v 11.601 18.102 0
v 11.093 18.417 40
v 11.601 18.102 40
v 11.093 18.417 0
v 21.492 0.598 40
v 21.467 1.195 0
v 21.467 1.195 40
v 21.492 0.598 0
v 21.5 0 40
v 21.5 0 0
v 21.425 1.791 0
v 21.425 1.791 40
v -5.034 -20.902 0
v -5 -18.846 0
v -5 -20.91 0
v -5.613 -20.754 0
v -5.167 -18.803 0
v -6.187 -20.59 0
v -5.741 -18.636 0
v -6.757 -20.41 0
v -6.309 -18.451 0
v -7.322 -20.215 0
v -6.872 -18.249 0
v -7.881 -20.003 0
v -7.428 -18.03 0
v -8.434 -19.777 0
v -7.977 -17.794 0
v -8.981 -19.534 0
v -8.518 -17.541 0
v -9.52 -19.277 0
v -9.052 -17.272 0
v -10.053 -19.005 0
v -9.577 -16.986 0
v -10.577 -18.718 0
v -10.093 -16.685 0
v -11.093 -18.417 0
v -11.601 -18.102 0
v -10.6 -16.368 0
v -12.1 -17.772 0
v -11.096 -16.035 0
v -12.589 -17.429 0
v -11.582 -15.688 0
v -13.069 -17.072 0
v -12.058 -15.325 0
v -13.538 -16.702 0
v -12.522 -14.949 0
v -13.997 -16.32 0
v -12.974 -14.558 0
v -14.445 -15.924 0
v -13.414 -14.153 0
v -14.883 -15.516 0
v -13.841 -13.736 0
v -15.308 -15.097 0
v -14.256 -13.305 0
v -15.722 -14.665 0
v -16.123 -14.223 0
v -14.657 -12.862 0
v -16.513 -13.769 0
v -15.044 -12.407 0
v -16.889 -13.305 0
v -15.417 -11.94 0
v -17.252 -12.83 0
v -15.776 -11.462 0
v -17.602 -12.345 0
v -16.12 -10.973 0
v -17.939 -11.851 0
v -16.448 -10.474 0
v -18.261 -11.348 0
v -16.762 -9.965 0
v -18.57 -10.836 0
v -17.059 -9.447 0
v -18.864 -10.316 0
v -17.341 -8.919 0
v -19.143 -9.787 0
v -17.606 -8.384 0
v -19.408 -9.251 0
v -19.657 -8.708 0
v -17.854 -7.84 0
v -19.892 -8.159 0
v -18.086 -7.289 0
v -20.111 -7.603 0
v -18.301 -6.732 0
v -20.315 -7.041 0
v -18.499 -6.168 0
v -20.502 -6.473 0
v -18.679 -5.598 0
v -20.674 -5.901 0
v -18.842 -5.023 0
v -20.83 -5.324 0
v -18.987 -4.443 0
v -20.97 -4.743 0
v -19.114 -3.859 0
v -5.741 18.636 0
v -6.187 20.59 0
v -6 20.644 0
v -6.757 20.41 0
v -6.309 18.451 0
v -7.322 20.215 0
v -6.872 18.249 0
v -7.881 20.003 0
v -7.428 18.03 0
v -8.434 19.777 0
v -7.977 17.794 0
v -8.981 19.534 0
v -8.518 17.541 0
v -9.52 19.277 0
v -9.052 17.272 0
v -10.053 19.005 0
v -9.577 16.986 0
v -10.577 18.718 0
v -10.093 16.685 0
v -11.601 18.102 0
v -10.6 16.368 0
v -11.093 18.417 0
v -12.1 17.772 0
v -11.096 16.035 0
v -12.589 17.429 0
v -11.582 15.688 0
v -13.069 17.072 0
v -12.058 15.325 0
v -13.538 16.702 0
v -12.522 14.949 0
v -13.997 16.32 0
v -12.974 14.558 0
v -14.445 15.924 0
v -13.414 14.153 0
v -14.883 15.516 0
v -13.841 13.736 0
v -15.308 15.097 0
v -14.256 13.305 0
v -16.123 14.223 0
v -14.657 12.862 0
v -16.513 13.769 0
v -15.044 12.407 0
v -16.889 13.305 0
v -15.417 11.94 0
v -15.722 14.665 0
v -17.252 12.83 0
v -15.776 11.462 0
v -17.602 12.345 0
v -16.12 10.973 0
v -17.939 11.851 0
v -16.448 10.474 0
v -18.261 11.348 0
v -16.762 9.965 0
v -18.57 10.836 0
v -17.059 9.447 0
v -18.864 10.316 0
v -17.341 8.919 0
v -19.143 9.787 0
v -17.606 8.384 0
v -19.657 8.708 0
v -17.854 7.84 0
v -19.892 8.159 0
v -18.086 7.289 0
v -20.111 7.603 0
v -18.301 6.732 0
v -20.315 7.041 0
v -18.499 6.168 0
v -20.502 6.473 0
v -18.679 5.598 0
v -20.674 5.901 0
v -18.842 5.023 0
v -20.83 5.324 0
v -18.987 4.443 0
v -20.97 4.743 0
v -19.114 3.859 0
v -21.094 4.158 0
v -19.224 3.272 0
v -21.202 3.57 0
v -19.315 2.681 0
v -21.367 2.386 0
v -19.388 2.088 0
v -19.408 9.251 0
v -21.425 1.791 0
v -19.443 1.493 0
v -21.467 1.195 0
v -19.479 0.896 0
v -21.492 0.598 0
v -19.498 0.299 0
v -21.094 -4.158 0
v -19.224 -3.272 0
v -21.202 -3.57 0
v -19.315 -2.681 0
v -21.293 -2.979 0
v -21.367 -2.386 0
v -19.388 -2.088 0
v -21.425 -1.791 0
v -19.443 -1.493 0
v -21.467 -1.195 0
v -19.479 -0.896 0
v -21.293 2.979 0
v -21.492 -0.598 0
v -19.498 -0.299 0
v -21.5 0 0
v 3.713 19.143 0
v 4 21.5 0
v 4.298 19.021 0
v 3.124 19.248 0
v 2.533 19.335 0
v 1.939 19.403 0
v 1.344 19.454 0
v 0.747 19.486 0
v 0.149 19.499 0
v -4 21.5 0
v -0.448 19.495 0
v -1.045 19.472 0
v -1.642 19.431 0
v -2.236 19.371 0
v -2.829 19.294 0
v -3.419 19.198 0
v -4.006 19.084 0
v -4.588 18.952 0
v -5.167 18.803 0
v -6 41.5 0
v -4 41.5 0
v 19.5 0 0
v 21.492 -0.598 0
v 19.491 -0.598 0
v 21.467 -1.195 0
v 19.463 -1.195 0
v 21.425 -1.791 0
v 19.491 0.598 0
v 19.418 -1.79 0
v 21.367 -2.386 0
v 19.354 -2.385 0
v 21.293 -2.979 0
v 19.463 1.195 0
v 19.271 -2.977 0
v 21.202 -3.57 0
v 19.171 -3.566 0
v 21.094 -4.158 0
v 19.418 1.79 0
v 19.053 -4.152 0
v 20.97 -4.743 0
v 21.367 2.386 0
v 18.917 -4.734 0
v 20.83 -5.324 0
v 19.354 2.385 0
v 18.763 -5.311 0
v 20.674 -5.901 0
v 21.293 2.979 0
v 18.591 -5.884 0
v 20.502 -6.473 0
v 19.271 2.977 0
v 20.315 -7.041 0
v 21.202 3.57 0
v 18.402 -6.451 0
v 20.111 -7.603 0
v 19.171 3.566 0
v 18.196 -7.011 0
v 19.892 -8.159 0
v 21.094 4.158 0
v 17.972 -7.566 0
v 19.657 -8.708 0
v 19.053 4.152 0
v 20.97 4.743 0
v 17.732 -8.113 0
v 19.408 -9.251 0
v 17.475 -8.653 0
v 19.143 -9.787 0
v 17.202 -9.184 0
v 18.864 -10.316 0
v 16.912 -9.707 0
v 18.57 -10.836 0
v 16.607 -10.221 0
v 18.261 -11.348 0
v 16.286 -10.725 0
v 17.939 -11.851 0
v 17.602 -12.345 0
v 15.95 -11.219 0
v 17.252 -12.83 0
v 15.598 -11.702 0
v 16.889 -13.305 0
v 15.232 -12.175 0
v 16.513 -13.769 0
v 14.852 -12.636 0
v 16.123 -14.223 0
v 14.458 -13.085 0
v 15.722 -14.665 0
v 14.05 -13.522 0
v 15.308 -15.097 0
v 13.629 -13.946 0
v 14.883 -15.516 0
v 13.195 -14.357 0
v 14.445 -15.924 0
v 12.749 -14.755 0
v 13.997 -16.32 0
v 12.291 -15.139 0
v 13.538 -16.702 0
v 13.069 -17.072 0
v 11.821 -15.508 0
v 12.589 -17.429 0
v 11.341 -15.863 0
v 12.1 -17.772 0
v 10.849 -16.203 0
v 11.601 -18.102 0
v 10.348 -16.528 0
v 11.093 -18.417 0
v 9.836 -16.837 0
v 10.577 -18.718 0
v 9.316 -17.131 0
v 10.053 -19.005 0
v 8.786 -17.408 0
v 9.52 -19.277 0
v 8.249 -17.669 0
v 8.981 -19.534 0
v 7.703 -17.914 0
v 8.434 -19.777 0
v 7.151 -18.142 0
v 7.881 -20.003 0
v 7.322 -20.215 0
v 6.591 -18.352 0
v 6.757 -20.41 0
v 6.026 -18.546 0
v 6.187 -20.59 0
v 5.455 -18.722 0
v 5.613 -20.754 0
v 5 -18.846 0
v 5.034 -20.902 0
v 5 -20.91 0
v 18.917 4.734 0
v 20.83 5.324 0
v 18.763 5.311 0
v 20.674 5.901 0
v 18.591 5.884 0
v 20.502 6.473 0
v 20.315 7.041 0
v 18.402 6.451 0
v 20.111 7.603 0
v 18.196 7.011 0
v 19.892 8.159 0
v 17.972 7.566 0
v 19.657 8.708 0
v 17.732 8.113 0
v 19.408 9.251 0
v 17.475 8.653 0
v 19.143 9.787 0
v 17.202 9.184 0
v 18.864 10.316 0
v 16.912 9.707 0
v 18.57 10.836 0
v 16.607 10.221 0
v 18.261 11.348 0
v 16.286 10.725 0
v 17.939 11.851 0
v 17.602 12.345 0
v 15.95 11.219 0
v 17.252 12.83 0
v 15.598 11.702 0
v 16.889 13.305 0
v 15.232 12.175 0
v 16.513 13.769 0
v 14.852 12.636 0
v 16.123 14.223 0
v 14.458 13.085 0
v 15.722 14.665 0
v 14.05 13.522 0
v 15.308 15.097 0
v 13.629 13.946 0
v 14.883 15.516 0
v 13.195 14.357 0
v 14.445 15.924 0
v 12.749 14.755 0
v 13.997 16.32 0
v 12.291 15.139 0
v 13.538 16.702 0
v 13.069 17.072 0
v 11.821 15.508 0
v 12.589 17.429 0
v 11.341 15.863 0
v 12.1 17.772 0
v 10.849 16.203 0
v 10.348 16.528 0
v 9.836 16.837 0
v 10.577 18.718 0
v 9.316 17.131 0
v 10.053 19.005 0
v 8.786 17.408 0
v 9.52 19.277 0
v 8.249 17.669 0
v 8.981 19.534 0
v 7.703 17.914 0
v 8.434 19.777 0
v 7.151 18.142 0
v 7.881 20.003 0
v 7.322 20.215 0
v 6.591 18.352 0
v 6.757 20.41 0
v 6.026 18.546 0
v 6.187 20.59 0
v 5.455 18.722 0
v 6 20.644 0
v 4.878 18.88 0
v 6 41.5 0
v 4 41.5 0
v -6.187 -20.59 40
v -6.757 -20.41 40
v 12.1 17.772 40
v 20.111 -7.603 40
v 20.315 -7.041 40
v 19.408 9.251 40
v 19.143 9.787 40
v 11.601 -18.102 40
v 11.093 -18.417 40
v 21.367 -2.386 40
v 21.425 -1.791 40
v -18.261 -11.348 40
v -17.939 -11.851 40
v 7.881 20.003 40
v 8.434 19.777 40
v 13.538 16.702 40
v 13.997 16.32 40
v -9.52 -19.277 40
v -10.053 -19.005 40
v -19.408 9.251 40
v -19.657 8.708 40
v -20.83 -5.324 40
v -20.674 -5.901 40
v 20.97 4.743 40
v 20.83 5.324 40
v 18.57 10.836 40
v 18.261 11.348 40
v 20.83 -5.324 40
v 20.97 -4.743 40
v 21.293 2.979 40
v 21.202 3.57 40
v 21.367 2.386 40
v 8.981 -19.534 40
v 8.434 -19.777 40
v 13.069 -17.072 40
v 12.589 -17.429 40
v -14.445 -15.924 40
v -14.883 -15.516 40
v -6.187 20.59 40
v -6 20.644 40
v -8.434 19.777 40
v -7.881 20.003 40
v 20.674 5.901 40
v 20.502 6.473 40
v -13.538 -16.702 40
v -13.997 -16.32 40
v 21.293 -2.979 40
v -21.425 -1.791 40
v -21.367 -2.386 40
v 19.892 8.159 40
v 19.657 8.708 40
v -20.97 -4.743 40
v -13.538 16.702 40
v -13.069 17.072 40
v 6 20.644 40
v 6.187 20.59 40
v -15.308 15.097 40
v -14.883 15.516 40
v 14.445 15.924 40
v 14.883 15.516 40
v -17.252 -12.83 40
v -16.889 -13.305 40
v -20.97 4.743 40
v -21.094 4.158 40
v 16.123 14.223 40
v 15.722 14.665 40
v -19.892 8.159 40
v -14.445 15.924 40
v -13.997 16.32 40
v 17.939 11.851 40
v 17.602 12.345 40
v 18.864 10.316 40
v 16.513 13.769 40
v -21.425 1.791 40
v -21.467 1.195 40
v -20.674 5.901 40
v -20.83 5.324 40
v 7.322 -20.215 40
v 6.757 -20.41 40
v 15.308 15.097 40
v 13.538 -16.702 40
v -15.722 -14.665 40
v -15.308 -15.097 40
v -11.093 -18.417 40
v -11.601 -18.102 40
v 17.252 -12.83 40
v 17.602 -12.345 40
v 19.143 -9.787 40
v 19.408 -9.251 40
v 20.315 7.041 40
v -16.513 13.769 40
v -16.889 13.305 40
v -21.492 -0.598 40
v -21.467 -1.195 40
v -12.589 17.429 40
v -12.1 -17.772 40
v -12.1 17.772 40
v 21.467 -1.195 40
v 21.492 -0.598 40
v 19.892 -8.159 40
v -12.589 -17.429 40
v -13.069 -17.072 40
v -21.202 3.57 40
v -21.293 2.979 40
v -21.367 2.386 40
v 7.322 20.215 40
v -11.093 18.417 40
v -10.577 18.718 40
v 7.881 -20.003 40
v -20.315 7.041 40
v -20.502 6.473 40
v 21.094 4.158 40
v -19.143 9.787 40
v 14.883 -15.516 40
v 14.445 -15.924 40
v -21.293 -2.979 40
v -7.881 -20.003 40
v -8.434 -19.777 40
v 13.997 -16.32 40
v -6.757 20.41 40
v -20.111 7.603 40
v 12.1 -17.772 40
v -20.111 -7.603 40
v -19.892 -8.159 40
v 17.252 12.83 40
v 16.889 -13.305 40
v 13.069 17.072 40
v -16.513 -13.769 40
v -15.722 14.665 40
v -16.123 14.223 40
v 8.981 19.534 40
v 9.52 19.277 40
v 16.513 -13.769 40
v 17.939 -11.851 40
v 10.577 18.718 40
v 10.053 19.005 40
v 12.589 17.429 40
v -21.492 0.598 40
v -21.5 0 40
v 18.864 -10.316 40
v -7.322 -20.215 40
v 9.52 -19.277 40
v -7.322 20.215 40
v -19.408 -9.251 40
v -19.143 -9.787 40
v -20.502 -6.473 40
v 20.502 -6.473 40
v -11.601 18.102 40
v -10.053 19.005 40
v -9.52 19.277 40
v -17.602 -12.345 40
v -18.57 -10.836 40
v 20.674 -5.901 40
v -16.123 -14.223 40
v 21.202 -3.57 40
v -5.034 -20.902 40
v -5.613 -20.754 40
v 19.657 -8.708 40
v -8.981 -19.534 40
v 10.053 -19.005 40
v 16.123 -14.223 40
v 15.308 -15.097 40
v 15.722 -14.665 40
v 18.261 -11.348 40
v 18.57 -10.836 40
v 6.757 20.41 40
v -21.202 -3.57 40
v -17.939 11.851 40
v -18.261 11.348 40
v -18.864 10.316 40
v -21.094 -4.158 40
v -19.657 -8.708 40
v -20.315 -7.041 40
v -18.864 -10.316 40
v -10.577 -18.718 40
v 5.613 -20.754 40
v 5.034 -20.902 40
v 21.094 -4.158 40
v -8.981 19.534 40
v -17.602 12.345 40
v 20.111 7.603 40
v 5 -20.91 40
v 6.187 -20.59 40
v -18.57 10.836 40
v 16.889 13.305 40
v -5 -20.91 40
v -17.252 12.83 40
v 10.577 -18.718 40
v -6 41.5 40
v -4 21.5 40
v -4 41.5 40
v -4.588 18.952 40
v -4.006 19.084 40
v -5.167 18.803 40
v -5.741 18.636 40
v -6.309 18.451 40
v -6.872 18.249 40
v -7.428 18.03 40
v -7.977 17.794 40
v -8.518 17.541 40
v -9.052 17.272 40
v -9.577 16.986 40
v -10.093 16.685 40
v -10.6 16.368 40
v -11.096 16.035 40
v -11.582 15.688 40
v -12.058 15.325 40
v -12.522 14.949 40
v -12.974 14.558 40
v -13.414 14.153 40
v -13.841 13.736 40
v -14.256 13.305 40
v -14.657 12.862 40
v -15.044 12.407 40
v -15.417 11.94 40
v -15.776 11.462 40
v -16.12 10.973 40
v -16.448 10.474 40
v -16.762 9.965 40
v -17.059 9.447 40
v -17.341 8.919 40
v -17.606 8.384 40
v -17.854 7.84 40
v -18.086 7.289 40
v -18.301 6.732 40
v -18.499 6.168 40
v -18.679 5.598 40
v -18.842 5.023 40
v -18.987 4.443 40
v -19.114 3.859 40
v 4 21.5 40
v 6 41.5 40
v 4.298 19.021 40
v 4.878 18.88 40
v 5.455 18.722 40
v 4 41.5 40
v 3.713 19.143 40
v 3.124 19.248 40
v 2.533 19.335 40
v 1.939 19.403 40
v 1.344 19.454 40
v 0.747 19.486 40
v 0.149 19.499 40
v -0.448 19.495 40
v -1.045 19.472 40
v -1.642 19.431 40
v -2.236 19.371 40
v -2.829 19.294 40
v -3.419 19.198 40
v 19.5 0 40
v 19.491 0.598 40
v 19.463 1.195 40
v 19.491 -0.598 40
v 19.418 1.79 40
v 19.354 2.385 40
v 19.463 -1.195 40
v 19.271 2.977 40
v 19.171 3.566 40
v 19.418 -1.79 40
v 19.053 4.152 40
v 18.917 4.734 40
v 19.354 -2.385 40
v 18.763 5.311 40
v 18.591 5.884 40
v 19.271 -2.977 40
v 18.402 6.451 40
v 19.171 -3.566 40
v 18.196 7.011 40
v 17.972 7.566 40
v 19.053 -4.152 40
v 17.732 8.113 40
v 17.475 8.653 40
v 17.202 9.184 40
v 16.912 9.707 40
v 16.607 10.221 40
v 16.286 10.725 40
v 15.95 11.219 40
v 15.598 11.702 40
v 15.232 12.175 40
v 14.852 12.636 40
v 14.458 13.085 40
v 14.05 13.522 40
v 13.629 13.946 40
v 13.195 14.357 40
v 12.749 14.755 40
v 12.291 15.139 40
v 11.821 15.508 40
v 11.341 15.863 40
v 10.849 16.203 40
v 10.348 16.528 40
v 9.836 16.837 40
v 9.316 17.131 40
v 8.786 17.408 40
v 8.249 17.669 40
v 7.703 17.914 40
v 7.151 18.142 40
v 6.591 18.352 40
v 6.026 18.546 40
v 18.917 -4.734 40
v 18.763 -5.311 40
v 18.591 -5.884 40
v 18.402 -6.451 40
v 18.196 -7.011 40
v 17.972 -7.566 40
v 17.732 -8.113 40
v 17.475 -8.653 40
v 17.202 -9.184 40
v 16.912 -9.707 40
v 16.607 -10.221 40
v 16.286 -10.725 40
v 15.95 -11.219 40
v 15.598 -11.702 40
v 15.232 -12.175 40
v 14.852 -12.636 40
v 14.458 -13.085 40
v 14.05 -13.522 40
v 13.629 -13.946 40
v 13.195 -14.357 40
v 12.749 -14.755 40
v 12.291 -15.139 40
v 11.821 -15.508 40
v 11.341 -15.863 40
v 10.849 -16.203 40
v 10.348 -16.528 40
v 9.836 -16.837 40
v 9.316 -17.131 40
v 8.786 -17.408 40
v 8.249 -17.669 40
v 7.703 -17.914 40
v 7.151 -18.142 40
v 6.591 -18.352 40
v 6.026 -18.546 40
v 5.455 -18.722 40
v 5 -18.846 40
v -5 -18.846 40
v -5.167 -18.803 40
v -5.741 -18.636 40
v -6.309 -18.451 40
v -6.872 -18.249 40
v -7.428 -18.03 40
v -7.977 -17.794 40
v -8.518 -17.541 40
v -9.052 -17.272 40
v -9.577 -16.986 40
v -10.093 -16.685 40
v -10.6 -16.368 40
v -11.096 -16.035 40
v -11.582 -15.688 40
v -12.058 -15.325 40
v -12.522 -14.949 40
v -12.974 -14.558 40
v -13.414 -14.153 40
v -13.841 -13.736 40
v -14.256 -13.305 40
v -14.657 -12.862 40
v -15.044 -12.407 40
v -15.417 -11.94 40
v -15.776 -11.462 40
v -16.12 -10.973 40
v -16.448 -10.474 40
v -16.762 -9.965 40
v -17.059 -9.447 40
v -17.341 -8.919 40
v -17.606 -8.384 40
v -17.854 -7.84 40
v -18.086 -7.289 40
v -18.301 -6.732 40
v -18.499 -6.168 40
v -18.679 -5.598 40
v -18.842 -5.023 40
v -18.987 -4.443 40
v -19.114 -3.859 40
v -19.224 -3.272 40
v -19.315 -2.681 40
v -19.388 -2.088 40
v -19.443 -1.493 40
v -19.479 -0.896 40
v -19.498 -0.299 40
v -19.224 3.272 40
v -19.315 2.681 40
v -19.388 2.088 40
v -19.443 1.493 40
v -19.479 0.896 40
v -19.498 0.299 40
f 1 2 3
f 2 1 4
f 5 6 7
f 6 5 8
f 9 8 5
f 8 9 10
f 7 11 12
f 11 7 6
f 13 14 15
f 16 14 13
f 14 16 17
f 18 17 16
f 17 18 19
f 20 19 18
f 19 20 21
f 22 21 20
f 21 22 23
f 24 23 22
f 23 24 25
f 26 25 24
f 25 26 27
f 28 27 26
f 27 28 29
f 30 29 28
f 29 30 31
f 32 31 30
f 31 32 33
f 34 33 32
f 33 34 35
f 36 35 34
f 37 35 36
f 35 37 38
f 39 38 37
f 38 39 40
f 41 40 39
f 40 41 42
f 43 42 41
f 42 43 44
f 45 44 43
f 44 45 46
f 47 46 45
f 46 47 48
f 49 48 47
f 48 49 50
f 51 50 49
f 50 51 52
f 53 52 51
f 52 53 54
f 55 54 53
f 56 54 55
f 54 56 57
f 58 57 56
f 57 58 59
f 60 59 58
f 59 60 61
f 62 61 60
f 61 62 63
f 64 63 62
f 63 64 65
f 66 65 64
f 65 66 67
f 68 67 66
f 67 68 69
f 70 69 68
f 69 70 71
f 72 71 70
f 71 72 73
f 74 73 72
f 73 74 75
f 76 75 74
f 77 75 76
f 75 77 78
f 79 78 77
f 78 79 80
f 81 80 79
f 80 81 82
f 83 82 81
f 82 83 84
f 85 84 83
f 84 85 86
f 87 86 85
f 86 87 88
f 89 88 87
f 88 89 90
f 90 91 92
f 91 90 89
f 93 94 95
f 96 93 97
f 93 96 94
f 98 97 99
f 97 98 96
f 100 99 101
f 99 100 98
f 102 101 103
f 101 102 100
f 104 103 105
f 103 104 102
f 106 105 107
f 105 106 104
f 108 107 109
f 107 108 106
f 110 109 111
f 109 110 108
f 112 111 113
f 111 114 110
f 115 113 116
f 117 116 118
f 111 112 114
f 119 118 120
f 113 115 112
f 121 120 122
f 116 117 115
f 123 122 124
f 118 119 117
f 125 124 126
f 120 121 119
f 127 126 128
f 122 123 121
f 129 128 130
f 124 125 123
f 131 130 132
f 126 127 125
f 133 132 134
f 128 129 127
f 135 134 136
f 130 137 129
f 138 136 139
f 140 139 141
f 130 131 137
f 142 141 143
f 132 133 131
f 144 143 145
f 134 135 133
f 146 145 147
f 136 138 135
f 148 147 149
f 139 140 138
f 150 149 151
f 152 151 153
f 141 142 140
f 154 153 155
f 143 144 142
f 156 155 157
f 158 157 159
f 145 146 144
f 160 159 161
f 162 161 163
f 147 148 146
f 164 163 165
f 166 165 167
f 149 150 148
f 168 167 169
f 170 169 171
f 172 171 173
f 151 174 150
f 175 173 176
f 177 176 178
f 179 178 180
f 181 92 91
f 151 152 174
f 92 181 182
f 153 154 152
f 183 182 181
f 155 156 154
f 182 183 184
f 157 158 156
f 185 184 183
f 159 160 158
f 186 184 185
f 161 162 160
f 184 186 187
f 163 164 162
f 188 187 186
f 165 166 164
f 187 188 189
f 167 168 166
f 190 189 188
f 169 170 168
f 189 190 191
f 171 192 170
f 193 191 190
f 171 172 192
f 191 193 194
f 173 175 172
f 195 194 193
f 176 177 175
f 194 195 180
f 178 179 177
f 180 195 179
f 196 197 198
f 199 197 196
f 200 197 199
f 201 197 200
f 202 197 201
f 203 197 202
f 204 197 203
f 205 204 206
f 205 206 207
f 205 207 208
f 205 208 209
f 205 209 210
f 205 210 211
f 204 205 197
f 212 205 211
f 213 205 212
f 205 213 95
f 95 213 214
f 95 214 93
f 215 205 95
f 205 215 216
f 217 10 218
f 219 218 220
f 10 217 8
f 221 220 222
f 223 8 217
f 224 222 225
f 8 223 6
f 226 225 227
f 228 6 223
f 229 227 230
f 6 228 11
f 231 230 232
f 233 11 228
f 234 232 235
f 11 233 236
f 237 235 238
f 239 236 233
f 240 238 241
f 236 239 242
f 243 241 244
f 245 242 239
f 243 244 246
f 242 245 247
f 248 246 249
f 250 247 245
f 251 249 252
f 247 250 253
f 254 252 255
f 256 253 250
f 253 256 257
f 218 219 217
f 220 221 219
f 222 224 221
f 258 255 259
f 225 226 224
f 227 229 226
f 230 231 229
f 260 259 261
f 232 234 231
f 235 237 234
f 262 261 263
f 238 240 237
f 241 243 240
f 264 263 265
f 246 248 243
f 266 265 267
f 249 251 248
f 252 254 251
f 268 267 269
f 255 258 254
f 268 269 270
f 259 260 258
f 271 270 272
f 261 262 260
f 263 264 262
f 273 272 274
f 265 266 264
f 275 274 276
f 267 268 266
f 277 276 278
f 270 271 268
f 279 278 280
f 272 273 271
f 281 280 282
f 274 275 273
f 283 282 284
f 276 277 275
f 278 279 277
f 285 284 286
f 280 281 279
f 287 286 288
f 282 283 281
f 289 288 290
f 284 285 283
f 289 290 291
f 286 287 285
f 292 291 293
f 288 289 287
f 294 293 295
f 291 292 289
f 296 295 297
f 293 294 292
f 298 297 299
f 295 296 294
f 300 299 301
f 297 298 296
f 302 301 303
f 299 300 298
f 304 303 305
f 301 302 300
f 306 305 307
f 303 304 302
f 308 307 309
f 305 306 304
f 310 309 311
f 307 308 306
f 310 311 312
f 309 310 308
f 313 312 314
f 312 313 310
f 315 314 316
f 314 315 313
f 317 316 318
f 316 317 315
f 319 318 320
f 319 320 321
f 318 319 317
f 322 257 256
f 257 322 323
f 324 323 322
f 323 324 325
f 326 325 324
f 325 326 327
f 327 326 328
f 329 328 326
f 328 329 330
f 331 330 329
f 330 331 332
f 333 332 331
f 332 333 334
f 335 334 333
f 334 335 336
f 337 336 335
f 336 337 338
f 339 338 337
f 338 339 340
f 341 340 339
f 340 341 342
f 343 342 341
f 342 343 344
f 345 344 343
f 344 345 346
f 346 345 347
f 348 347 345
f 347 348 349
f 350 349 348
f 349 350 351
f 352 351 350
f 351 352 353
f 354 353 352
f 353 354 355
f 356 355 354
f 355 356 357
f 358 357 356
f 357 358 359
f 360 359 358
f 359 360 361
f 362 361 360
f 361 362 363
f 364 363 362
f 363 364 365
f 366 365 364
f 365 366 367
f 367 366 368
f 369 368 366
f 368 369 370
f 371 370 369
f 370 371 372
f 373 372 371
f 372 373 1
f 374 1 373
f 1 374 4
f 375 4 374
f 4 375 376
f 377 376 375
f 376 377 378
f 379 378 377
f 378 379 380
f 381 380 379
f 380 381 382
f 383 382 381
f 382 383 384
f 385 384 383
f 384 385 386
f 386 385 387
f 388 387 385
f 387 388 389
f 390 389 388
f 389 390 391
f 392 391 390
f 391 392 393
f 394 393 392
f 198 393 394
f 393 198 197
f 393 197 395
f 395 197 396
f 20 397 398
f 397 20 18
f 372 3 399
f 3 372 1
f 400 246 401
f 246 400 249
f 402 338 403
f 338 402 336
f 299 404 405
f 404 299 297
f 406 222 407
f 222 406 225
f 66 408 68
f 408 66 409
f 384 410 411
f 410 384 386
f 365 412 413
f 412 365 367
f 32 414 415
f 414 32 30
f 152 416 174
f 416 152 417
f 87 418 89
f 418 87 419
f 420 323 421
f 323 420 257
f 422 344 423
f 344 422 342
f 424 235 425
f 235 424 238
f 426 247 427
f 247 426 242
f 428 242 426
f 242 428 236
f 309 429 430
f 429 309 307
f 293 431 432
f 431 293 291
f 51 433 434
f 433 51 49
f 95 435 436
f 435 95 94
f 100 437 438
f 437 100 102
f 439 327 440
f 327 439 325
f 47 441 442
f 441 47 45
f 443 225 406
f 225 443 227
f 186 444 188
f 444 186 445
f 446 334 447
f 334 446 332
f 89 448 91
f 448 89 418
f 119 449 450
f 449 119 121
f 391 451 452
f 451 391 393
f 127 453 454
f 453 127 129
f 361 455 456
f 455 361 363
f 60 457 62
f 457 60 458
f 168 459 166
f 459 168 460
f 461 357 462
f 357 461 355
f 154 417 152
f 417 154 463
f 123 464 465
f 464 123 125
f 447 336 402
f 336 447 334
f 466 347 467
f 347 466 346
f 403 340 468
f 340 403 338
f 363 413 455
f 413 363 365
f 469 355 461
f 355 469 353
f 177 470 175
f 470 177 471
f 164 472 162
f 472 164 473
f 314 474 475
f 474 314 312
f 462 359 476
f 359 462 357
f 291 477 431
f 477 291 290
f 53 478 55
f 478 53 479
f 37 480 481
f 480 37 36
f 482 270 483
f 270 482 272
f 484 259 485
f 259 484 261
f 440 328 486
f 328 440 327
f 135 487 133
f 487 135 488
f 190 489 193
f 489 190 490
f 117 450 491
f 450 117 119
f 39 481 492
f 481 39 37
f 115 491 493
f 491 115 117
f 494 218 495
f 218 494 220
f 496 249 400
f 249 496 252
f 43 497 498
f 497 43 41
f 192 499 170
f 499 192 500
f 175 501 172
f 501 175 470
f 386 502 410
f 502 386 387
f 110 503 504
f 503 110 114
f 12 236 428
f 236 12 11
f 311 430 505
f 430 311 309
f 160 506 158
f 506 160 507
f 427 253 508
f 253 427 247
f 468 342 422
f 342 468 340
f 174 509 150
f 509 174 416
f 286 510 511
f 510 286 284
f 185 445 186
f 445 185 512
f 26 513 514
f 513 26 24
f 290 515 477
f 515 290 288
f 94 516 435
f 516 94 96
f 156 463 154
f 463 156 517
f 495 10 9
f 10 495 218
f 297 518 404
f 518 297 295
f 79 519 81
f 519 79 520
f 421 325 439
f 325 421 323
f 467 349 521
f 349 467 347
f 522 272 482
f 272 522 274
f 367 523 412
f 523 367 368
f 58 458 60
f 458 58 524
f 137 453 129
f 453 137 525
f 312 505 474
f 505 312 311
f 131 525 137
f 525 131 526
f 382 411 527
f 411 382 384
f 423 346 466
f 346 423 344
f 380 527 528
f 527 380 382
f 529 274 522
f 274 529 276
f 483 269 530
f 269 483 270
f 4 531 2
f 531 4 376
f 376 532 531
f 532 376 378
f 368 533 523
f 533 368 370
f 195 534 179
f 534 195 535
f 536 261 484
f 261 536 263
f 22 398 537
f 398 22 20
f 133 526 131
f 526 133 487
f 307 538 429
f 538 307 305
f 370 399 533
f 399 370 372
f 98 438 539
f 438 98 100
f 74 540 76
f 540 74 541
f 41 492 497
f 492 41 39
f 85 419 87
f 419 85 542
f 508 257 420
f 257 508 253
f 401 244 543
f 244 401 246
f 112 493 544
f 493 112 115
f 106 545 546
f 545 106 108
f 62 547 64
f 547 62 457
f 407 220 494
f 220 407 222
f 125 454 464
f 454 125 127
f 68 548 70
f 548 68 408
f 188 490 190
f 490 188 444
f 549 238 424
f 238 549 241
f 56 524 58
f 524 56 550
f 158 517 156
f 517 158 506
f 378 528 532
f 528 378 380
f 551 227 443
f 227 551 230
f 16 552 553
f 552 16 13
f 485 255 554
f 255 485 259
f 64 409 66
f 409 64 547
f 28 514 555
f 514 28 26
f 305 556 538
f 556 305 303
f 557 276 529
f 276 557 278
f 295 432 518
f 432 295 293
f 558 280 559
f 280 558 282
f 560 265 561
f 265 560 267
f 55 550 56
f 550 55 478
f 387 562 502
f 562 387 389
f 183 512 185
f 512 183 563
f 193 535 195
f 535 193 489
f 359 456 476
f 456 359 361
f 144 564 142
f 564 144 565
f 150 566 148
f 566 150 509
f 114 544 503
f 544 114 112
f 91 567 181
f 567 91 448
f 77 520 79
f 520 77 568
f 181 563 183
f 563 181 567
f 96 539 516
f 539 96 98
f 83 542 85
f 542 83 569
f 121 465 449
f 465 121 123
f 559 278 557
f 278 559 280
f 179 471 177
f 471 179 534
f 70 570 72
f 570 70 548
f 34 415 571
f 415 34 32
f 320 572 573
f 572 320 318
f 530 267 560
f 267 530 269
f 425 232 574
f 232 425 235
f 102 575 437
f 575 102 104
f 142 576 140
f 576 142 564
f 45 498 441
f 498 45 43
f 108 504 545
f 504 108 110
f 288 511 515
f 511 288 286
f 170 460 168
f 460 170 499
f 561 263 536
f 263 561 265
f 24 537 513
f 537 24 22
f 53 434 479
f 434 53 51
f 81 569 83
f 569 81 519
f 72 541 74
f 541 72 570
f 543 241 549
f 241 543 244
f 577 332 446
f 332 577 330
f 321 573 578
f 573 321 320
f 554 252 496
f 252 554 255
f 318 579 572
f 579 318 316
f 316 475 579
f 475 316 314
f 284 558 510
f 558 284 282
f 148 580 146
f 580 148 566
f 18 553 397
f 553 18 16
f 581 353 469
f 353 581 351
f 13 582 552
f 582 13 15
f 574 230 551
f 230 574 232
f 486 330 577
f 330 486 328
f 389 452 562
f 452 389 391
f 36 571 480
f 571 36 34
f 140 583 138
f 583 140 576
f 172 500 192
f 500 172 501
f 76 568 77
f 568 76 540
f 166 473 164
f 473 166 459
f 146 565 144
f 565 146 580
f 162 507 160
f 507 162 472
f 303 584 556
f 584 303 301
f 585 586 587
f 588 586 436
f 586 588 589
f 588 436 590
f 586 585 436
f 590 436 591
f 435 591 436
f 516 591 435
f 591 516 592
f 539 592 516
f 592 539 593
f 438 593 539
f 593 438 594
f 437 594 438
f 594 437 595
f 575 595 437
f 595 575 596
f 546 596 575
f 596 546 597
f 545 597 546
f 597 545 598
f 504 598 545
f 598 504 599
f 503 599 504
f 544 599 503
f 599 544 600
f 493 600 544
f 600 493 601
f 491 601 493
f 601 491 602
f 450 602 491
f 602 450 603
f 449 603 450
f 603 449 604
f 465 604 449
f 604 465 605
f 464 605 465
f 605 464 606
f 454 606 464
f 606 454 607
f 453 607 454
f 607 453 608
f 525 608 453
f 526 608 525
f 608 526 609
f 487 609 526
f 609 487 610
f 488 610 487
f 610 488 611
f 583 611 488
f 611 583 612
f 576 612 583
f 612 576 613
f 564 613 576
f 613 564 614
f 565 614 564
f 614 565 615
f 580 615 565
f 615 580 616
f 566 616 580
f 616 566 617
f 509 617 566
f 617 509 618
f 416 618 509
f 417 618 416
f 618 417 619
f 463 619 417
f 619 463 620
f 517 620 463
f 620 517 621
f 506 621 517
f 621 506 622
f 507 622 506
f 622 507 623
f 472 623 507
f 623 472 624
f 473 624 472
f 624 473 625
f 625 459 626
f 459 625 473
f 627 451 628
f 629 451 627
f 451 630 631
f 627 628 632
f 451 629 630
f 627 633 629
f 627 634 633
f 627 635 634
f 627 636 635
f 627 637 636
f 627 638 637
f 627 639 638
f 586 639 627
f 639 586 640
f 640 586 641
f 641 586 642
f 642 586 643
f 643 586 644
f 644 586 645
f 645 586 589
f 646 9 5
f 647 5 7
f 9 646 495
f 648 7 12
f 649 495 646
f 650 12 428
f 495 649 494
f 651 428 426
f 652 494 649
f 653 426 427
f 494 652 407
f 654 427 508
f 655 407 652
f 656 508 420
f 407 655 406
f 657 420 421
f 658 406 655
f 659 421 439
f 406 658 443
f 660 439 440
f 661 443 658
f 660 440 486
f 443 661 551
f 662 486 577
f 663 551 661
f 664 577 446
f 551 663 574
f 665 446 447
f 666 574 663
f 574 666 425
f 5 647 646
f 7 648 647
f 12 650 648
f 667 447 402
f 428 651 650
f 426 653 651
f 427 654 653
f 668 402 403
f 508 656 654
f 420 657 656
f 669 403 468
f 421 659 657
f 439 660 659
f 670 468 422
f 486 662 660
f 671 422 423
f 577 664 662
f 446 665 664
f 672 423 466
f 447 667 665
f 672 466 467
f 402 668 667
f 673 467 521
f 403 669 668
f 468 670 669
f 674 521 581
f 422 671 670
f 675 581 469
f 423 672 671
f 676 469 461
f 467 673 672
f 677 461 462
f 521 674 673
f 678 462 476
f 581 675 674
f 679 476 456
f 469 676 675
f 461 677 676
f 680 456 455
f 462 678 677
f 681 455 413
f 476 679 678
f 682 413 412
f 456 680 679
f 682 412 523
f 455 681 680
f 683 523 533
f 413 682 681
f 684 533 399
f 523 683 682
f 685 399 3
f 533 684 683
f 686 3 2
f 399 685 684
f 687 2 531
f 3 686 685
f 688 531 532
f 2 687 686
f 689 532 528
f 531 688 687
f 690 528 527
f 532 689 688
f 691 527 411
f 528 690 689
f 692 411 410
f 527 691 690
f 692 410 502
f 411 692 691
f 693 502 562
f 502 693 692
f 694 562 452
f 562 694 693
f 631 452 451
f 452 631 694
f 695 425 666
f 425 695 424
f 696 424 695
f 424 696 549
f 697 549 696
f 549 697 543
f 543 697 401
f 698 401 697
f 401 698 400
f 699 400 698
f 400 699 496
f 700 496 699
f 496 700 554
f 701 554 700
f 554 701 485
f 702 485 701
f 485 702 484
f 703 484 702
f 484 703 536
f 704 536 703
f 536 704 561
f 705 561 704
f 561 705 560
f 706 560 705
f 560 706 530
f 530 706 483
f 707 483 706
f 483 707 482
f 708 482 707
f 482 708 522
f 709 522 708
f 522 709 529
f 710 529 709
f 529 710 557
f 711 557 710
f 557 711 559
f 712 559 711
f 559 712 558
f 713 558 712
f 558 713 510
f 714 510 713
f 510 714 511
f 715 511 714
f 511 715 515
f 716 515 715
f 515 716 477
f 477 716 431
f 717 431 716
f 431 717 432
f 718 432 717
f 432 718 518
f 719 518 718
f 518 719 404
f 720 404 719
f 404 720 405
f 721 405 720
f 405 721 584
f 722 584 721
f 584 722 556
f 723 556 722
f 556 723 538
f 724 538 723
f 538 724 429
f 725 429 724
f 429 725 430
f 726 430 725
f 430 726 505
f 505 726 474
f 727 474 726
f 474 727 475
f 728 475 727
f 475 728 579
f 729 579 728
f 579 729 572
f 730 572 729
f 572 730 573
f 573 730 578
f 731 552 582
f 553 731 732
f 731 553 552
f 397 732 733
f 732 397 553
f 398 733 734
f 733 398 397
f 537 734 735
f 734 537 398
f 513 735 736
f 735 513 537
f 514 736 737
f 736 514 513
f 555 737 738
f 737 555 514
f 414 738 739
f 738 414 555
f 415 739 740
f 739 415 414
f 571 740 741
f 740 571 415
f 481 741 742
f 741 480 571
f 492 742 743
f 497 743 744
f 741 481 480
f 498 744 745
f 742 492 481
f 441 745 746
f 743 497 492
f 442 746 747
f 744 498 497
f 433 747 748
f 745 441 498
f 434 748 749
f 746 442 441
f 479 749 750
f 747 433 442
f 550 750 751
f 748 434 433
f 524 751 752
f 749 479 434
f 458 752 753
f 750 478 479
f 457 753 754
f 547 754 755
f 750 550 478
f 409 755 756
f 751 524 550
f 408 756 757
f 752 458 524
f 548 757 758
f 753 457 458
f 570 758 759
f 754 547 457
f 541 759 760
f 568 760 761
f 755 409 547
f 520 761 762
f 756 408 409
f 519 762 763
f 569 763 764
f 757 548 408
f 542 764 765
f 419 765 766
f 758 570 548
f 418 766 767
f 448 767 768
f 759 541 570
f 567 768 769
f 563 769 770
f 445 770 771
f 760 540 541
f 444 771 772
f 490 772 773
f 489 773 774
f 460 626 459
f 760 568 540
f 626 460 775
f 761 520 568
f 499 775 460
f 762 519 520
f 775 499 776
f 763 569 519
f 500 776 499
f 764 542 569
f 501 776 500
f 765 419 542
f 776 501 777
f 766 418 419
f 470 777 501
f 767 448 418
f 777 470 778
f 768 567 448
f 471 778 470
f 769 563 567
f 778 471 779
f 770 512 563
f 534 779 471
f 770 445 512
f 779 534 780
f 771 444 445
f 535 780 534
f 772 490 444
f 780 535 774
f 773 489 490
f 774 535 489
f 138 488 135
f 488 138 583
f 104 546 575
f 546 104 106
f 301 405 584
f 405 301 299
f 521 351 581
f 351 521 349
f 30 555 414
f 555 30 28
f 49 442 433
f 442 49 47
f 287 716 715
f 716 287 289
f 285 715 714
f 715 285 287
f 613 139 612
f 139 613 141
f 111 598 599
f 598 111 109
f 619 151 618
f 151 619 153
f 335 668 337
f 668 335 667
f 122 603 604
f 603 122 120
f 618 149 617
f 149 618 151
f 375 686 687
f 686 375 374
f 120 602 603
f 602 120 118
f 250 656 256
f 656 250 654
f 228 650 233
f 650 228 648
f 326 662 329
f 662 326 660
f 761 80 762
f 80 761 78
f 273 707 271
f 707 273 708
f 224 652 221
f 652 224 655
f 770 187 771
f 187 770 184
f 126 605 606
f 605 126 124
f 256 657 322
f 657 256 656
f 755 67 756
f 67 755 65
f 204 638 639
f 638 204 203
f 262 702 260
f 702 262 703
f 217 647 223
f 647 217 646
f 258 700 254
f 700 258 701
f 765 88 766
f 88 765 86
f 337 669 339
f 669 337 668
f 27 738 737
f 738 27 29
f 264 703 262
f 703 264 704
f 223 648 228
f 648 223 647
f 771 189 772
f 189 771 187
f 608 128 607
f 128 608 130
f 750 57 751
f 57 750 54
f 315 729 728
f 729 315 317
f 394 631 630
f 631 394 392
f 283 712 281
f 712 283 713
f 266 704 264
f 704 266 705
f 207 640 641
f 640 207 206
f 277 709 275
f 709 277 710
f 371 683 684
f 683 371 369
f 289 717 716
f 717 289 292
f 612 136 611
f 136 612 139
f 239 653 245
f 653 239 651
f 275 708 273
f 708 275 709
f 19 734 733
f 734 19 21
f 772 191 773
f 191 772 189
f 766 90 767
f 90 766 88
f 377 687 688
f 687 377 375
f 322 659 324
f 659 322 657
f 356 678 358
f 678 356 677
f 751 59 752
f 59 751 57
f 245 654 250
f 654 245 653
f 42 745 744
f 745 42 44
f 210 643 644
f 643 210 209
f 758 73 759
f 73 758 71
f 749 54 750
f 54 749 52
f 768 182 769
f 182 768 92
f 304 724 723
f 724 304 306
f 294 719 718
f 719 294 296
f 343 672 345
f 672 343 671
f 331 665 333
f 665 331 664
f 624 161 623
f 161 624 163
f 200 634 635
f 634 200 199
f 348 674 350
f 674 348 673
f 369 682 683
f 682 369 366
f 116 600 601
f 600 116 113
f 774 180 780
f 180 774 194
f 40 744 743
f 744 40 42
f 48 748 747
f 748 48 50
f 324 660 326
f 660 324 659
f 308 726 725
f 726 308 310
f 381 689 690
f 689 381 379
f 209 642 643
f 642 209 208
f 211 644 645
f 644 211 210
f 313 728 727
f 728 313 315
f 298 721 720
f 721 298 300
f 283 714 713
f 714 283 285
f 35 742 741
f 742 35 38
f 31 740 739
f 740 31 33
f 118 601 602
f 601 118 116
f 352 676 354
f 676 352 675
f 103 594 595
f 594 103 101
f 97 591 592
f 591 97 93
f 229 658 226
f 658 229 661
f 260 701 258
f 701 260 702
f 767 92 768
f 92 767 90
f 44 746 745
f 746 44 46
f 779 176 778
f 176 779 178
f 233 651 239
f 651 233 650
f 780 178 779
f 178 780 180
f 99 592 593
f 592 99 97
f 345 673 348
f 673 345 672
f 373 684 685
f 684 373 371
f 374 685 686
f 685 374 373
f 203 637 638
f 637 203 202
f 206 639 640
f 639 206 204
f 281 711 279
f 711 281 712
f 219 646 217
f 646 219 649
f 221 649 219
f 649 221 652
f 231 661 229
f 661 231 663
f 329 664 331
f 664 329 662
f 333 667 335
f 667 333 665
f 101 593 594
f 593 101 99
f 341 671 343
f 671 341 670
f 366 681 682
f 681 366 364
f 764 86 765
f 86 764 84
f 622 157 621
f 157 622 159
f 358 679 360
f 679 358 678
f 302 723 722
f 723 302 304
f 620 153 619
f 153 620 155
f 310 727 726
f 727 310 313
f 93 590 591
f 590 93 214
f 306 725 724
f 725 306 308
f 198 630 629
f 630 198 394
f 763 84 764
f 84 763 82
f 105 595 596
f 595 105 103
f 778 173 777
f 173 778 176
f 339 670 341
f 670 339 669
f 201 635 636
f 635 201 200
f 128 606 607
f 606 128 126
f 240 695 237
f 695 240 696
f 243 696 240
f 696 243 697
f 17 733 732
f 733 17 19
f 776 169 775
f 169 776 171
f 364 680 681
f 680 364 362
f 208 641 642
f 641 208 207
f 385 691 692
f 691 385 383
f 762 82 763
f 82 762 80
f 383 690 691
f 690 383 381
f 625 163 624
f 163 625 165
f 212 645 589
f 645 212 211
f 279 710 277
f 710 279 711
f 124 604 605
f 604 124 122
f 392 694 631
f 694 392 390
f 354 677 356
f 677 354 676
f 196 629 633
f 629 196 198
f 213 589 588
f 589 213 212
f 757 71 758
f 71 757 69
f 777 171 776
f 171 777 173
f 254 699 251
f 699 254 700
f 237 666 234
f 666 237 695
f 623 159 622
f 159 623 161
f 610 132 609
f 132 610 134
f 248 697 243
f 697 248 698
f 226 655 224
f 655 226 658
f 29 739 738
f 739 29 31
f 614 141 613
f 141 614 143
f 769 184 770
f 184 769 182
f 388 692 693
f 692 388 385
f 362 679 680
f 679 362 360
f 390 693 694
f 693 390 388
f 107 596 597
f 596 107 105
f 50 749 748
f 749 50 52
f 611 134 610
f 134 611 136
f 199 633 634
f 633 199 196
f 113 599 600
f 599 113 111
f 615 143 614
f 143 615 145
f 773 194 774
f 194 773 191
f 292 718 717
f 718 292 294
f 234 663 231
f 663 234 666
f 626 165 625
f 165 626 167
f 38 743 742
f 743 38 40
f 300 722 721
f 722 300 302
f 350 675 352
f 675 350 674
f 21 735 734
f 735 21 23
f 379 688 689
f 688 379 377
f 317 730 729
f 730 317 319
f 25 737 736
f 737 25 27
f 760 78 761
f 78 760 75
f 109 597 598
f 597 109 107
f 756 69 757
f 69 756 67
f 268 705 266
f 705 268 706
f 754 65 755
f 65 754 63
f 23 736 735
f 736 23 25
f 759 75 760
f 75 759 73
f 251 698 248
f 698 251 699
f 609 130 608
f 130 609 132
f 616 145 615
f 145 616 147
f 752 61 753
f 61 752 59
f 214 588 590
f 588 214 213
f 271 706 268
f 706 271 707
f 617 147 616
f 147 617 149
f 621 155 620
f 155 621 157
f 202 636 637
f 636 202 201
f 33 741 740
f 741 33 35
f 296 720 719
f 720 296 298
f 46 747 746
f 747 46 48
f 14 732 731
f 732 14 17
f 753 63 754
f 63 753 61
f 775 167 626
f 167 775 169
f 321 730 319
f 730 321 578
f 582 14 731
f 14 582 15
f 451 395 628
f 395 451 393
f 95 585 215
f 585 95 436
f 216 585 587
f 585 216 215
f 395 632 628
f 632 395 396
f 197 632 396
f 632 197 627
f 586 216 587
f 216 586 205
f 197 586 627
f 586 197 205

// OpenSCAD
h=40;
id=39;
cutout_w=10;
tablet_d=8;
tablet_h=20;
wall=2;

$fa=1;
$fs=0.6;

union() {
    difference() {
        cylinder(d=id+wall*2, h=h);
        cylinder(d=id, h=h);
        translate([-cutout_w/2, -id/2-wall, 0]) cube([cutout_w, id/2, h]);
    }
    translate([-tablet_d/2-wall, id/2, 0]) difference() {
        cube([tablet_d+wall*2, tablet_h+wall, h]);
        translate([wall, wall, 0]) cube([tablet_d, tablet_h, h]);
    }
}

        
        
